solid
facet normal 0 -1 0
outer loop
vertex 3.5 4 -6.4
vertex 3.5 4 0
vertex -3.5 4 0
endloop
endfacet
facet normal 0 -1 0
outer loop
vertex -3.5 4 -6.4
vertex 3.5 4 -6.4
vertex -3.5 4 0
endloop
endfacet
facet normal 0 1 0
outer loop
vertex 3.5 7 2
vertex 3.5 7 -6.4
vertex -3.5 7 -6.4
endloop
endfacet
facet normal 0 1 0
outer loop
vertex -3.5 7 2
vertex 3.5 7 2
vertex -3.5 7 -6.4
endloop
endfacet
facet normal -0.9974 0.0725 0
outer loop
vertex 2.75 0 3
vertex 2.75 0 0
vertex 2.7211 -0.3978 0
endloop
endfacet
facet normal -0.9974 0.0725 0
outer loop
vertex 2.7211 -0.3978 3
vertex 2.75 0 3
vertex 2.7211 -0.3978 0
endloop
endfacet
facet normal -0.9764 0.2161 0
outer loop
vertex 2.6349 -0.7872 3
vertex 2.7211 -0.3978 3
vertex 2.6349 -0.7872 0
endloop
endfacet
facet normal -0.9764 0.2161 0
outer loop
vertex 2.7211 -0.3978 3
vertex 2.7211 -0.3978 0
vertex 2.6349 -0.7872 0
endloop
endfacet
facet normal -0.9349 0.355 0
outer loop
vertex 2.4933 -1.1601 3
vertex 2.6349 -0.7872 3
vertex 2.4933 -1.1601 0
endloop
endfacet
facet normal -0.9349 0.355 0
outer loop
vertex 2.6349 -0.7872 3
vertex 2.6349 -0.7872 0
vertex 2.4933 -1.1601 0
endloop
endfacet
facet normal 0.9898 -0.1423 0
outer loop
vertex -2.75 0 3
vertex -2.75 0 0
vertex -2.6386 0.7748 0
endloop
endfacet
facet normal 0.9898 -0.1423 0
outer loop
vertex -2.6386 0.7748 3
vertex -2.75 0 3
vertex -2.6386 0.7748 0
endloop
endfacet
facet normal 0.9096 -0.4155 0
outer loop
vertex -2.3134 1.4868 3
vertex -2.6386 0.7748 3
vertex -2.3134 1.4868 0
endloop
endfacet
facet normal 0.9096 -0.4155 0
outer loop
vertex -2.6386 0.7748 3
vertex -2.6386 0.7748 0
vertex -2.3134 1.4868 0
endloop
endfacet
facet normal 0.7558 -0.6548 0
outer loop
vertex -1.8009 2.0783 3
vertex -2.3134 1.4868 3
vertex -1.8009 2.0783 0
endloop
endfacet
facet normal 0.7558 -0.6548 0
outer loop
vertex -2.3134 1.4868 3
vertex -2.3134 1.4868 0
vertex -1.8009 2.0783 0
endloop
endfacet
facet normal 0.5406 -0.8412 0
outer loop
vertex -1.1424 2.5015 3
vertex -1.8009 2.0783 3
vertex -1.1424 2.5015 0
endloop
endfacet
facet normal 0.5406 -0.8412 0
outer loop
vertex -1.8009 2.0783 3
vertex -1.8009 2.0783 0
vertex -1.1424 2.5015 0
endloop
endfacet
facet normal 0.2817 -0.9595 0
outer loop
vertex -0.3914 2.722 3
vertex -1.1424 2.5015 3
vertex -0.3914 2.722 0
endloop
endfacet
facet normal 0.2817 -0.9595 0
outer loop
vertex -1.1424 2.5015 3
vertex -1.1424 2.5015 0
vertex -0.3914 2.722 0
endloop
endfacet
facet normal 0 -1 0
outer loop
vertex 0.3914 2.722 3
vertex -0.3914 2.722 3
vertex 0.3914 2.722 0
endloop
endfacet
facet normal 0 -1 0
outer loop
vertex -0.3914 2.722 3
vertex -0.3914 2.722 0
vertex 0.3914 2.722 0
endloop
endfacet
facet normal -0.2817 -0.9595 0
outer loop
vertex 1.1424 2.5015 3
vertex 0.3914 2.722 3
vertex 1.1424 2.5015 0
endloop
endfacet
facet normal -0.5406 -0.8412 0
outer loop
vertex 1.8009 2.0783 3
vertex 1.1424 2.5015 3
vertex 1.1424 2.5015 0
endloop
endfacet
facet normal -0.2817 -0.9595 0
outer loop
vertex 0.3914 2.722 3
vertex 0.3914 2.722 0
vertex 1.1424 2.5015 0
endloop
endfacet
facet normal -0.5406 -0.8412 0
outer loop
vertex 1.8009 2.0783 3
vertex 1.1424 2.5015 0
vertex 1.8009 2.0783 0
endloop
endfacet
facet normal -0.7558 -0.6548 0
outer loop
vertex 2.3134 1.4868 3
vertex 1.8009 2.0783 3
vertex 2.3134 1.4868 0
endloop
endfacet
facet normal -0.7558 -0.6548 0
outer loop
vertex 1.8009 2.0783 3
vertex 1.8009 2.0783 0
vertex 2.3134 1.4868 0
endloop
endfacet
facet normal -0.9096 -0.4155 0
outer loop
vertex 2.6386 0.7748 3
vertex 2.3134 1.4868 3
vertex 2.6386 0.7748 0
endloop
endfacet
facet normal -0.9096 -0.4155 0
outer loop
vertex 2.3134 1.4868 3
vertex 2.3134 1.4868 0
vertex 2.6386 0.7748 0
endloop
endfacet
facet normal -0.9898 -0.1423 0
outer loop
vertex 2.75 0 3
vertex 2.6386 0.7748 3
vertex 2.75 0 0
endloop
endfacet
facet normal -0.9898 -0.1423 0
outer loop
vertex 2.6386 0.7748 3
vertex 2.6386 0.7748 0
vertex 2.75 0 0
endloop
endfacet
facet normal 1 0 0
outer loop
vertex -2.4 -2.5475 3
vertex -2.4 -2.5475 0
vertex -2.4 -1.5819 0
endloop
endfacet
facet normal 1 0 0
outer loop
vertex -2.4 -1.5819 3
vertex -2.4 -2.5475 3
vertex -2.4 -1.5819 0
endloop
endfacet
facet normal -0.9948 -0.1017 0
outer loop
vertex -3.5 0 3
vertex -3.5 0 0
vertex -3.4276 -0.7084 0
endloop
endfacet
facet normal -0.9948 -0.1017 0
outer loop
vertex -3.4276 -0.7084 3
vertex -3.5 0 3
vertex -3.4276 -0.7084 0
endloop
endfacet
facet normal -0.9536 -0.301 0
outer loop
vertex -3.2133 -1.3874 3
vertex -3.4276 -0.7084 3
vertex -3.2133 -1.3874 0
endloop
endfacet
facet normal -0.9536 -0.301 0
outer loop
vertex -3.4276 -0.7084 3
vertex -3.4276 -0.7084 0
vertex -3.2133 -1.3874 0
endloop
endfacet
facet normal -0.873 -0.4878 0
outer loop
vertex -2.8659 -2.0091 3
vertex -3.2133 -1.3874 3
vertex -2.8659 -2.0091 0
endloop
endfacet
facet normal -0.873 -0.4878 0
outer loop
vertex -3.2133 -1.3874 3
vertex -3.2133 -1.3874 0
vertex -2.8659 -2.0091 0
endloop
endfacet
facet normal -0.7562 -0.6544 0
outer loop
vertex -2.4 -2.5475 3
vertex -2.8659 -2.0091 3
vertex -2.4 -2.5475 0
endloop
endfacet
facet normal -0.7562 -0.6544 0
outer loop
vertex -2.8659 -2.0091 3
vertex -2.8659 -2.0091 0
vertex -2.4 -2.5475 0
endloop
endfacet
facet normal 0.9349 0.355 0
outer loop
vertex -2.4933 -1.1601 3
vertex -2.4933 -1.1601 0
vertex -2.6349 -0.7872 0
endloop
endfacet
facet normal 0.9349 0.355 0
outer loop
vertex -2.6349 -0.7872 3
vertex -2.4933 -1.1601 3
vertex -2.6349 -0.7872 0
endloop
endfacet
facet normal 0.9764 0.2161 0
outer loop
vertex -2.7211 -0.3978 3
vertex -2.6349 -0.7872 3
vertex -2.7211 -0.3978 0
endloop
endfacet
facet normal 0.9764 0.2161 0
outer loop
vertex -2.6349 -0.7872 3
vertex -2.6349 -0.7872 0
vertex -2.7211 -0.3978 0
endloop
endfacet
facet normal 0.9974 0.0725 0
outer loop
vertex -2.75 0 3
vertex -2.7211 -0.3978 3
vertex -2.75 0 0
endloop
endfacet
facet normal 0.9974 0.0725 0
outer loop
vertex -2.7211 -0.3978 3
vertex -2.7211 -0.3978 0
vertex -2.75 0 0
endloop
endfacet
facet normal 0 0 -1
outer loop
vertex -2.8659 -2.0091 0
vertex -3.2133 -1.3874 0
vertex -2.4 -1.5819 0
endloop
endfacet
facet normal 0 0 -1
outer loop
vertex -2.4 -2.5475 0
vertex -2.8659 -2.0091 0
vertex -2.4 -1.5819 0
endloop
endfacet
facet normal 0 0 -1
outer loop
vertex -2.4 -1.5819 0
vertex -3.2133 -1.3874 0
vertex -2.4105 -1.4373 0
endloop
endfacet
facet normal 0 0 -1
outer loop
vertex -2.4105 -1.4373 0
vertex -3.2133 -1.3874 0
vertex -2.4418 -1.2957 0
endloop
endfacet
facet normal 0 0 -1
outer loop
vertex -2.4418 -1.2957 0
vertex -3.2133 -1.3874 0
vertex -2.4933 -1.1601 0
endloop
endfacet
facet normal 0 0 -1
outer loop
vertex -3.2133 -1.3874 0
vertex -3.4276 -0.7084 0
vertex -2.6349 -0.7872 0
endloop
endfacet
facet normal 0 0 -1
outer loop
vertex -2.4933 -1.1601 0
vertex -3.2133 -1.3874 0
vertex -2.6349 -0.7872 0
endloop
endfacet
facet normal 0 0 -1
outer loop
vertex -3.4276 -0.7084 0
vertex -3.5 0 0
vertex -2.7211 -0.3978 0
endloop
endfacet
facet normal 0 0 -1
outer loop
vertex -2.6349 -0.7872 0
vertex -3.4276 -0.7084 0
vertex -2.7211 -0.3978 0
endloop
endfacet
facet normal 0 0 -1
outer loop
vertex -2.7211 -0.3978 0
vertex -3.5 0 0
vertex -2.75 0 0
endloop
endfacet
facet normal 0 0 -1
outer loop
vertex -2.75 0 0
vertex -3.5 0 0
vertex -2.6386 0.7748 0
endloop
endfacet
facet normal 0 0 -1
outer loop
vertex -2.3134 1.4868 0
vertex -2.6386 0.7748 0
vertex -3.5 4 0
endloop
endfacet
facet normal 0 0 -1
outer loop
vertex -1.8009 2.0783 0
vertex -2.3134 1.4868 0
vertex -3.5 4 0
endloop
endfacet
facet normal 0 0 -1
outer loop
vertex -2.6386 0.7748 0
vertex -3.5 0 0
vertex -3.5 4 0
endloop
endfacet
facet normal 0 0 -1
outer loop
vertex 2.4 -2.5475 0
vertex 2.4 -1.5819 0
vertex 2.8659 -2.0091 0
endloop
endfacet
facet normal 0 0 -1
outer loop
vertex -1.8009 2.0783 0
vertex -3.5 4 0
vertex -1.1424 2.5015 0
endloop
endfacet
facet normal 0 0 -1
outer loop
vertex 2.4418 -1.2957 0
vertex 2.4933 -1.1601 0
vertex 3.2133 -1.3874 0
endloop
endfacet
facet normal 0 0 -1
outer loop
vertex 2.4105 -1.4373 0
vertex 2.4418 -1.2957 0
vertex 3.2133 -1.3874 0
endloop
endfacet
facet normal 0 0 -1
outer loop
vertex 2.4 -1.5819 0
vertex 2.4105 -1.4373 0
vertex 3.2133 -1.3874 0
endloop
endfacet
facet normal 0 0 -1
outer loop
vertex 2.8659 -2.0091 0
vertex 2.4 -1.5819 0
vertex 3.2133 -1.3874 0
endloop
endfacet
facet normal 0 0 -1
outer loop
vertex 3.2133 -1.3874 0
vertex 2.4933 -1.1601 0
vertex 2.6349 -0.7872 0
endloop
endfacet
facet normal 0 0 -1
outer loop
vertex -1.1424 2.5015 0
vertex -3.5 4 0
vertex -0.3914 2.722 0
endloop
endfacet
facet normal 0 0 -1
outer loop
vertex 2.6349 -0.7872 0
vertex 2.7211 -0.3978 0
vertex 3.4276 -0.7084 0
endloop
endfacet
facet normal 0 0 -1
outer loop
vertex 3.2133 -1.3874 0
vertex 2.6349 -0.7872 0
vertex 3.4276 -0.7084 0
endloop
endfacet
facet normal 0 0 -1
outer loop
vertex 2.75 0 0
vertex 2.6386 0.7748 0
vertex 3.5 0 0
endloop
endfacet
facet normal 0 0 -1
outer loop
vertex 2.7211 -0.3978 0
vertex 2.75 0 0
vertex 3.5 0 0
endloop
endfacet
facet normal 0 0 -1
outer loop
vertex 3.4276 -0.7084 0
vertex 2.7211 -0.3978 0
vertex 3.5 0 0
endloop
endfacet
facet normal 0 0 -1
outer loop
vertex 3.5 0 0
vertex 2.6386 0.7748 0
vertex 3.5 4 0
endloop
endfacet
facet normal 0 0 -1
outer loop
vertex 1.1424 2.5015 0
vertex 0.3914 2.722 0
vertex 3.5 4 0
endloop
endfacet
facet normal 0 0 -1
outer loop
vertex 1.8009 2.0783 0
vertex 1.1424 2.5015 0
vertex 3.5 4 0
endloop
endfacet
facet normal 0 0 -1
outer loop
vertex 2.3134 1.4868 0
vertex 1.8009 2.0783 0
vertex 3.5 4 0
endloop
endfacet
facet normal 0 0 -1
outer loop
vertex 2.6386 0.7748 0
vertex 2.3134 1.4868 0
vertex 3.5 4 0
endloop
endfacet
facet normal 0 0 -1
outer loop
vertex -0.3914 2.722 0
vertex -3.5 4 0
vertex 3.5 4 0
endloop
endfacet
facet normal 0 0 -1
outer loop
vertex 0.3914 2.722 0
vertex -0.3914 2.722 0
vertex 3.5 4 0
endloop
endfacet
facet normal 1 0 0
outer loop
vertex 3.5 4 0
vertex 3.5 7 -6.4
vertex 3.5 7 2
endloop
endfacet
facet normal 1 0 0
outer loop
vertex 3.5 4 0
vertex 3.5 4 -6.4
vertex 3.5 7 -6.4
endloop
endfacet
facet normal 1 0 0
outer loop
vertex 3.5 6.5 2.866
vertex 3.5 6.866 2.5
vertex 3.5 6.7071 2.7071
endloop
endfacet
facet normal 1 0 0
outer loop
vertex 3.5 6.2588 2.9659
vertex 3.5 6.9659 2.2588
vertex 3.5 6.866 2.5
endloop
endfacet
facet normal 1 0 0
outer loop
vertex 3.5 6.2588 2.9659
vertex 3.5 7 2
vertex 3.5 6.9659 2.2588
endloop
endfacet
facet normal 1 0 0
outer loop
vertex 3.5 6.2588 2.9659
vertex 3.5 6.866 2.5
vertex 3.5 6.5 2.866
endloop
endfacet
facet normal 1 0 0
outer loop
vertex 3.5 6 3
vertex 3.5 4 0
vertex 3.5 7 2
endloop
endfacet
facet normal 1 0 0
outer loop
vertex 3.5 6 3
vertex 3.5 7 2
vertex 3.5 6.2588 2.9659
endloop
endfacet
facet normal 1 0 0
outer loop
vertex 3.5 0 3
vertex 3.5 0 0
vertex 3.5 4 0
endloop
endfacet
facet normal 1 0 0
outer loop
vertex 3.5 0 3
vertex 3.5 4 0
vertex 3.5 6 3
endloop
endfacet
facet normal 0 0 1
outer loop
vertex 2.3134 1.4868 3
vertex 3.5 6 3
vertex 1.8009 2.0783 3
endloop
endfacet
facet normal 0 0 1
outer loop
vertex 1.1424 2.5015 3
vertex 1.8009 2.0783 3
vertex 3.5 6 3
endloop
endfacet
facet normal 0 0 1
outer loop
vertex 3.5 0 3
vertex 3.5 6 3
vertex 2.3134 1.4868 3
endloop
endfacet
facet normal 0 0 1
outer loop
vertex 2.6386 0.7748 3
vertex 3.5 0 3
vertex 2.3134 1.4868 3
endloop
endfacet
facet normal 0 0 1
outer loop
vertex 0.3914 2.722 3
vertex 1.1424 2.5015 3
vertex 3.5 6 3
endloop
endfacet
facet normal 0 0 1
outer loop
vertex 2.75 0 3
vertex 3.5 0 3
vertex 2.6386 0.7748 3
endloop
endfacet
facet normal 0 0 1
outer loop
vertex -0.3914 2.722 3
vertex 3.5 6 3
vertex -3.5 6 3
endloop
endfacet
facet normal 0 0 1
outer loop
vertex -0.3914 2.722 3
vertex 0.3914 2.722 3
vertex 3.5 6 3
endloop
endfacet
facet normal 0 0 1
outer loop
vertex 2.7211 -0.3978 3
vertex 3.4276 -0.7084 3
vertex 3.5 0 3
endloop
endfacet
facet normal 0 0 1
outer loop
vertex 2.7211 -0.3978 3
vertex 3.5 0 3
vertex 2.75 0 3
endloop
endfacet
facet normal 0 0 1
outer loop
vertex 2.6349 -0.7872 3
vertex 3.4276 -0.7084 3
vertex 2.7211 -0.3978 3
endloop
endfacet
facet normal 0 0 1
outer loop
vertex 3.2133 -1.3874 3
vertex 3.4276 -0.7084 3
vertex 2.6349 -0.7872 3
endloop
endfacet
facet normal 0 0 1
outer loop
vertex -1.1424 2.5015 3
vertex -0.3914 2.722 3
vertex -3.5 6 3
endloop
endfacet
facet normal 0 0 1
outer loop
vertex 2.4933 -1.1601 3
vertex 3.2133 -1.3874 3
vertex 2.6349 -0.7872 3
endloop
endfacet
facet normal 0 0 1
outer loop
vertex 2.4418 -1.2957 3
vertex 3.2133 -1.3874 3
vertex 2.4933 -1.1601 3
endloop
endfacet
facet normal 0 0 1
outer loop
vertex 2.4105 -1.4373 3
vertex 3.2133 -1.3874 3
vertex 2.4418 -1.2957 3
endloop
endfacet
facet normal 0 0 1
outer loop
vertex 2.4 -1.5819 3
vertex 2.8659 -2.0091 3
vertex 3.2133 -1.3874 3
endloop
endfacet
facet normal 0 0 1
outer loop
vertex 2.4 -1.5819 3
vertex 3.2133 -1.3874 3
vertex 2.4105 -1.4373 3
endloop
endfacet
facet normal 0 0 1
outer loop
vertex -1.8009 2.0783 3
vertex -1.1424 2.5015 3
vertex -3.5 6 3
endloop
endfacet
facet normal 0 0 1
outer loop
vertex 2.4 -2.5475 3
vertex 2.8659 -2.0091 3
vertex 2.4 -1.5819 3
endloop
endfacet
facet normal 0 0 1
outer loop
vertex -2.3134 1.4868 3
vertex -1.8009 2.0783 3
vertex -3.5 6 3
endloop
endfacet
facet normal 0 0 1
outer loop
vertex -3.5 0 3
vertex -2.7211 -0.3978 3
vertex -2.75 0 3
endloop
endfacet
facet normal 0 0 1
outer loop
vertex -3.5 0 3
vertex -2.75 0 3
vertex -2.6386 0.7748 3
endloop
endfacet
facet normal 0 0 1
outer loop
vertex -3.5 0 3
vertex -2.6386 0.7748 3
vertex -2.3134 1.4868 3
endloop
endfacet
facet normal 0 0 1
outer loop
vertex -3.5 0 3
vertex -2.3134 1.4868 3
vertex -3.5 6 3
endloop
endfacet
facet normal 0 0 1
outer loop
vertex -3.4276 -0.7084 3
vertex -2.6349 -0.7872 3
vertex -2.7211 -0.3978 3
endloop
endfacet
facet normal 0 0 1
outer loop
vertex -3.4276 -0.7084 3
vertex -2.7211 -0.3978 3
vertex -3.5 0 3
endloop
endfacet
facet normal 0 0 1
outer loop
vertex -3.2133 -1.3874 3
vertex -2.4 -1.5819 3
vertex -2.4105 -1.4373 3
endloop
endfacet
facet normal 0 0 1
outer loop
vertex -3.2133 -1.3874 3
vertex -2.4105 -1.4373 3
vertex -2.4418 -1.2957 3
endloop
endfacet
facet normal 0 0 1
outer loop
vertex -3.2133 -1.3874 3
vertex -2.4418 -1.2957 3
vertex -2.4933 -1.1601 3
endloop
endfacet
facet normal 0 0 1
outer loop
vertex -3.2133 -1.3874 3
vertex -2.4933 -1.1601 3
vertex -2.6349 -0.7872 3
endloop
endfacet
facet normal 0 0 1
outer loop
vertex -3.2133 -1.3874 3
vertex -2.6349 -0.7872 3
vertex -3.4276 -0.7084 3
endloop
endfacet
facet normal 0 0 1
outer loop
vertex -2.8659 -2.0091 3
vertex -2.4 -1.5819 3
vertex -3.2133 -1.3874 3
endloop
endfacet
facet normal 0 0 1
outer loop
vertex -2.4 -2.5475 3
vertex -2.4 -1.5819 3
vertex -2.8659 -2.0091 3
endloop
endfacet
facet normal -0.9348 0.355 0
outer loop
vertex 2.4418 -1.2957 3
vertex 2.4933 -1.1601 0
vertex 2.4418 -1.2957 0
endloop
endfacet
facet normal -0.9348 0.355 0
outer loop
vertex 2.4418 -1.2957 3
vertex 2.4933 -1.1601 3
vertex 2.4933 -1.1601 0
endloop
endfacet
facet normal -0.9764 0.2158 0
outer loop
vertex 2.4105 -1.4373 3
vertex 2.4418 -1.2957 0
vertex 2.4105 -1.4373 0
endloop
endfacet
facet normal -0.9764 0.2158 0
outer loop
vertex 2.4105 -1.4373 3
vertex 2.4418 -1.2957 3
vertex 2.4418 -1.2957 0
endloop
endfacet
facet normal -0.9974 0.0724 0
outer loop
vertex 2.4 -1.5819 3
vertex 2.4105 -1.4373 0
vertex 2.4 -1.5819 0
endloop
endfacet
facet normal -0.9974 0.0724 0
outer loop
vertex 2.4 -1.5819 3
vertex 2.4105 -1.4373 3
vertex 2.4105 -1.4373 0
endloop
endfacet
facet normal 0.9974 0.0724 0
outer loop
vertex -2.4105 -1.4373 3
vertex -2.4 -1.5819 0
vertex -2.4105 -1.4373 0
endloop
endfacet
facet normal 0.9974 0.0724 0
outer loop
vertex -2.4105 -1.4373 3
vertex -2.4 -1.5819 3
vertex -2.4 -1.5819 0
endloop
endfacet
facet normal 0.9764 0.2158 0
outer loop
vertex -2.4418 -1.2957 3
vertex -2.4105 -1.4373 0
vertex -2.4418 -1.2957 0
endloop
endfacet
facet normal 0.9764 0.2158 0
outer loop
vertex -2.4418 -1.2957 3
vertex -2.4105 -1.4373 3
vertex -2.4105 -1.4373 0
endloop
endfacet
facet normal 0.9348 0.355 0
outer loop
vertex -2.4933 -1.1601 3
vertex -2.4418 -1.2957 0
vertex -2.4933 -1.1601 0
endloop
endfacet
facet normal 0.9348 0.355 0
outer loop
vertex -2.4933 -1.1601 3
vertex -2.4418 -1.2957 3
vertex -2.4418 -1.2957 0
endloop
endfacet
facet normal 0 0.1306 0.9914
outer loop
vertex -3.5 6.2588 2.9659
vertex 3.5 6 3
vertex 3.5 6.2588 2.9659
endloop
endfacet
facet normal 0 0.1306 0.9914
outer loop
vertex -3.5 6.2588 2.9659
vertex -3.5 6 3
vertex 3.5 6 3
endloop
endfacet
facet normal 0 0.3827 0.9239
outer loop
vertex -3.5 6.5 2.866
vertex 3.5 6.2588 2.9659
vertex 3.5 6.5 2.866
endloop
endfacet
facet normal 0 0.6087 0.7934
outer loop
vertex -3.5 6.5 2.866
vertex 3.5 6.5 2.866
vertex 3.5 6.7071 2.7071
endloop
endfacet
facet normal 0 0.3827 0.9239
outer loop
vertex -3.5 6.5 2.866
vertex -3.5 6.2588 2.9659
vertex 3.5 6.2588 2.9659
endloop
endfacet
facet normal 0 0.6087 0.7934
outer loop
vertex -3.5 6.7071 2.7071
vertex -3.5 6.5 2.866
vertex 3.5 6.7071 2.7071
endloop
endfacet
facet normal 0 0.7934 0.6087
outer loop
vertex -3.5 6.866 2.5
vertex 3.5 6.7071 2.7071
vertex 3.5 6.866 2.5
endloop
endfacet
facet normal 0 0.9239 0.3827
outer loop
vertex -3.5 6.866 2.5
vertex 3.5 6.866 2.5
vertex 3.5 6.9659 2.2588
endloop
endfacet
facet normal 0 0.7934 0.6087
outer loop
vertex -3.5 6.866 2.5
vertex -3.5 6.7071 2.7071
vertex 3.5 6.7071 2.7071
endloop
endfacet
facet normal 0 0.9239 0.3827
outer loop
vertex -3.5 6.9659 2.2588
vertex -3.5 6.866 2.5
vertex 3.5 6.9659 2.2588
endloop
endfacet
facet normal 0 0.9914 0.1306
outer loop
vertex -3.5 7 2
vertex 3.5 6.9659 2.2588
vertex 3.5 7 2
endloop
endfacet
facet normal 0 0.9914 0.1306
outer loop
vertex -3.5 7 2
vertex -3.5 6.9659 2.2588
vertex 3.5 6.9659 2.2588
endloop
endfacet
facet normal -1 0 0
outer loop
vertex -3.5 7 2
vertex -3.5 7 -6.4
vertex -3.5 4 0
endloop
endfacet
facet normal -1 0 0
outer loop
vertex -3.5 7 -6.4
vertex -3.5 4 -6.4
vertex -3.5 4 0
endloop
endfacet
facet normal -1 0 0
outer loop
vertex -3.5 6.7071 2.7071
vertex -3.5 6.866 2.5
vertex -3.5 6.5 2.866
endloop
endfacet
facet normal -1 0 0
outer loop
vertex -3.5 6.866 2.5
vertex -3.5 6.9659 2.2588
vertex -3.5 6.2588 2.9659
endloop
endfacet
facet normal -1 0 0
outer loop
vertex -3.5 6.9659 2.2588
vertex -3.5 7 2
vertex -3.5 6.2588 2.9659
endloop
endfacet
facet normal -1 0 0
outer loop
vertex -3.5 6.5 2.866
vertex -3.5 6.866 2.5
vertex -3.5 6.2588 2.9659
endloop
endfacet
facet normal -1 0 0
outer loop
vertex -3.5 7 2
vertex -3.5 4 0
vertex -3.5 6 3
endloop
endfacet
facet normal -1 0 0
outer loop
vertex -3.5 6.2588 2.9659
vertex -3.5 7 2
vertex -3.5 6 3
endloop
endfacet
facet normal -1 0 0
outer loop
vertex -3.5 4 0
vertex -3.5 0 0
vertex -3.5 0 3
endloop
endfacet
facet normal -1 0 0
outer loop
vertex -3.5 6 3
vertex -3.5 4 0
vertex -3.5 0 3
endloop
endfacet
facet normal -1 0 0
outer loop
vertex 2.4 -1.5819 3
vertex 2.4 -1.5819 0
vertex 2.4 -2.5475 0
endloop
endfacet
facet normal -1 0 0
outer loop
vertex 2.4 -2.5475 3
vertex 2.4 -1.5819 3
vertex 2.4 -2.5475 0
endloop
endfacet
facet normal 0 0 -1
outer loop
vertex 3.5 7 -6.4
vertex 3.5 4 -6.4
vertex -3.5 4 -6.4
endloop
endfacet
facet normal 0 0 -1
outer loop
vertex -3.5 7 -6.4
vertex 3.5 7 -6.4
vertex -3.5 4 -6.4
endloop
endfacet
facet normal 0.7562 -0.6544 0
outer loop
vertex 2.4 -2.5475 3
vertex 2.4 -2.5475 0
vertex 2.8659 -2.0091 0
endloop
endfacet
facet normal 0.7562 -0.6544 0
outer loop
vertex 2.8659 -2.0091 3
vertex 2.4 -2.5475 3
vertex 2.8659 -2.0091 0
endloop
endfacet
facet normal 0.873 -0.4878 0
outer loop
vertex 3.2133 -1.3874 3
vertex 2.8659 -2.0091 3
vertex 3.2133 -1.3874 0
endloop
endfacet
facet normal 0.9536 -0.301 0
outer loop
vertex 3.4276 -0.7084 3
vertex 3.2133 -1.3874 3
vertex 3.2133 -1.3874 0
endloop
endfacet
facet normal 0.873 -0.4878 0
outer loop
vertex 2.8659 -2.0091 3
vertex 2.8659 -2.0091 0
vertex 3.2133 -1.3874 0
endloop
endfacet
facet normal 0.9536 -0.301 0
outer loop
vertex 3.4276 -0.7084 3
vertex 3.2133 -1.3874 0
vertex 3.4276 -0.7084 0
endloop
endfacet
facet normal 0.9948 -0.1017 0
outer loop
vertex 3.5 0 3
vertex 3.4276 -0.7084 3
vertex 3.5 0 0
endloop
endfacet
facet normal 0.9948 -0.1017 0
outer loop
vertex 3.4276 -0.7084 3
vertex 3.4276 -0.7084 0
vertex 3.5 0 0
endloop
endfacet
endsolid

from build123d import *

# Parameters (mm, degrees)
F1_DEPTH = 3
F2_W     = 7
F2_H     = 9.4
F3_DEPTH = 3
F4_R     = 1


with BuildPart() as f1:
    # F0 (on Top) → F1 (new body)
    with BuildSketch(Plane.XY):
        with BuildLine():
            ThreePointArc((-2.4, -1.3425721582), (-2.6610618181, -0.6937218463), (-2.75, 0))
            Line((-2.75, 0), (-3.5, 0))
            ThreePointArc((-3.5, 0), (-3.2132538026, -1.3874436926), (-2.4, -2.5475478406))
            Line((-2.4, -2.5475478406), (-2.4, -1.3425721582))
        make_face()
        with BuildLine():
            ThreePointArc((-2.75, 0), (0, 2.75), (2.75, 0))
            Line((2.75, 0), (3.5, 0))
            ThreePointArc((3.5, 0), (0, 3.5), (-3.5, 0))
            Line((-3.5, 0), (-2.75, 0))
        make_face()
        with BuildLine():
            Line((3.5, 0), (2.75, 0))
            ThreePointArc((2.75, 0), (2.6610618181, -0.6937218463), (2.4, -1.3425721582))
            Line((2.4, -1.3425721582), (2.4, -2.5475478406))
            ThreePointArc((2.4, -2.5475478406), (3.2132538026, -1.3874436926), (3.5, 0))
        make_face()
        with BuildLine():
            ThreePointArc((-3.5, 0), (0, 3.5), (3.5, 0))
            Line((3.5, 0), (3.5, 4))
            Line((3.5, 4), (-3.5, 4))
            Line((-3.5, 4), (-3.5, 0))
        make_face()
    extrude(amount=F1_DEPTH)

    # F2 (on face) → F3 (join)
    with BuildSketch(Plane(origin=(0, 4, 0), x_dir=(-1, 0, 0), z_dir=(0, 1, 0))):
        with Locations((0, -1.7)):
            Rectangle(F2_W, F2_H)
    extrude(amount=F3_DEPTH)

    # F4
    f4_edges = [f1.edges().sort_by_distance(p)[0] for p in [
        (0, 7, 3),
        (-2.4, -1.342572, 1.5),
        (2.4, -1.342572, 1.5),
    ]]
    fillet(f4_edges, radius=F4_R)


solid = f1.part
